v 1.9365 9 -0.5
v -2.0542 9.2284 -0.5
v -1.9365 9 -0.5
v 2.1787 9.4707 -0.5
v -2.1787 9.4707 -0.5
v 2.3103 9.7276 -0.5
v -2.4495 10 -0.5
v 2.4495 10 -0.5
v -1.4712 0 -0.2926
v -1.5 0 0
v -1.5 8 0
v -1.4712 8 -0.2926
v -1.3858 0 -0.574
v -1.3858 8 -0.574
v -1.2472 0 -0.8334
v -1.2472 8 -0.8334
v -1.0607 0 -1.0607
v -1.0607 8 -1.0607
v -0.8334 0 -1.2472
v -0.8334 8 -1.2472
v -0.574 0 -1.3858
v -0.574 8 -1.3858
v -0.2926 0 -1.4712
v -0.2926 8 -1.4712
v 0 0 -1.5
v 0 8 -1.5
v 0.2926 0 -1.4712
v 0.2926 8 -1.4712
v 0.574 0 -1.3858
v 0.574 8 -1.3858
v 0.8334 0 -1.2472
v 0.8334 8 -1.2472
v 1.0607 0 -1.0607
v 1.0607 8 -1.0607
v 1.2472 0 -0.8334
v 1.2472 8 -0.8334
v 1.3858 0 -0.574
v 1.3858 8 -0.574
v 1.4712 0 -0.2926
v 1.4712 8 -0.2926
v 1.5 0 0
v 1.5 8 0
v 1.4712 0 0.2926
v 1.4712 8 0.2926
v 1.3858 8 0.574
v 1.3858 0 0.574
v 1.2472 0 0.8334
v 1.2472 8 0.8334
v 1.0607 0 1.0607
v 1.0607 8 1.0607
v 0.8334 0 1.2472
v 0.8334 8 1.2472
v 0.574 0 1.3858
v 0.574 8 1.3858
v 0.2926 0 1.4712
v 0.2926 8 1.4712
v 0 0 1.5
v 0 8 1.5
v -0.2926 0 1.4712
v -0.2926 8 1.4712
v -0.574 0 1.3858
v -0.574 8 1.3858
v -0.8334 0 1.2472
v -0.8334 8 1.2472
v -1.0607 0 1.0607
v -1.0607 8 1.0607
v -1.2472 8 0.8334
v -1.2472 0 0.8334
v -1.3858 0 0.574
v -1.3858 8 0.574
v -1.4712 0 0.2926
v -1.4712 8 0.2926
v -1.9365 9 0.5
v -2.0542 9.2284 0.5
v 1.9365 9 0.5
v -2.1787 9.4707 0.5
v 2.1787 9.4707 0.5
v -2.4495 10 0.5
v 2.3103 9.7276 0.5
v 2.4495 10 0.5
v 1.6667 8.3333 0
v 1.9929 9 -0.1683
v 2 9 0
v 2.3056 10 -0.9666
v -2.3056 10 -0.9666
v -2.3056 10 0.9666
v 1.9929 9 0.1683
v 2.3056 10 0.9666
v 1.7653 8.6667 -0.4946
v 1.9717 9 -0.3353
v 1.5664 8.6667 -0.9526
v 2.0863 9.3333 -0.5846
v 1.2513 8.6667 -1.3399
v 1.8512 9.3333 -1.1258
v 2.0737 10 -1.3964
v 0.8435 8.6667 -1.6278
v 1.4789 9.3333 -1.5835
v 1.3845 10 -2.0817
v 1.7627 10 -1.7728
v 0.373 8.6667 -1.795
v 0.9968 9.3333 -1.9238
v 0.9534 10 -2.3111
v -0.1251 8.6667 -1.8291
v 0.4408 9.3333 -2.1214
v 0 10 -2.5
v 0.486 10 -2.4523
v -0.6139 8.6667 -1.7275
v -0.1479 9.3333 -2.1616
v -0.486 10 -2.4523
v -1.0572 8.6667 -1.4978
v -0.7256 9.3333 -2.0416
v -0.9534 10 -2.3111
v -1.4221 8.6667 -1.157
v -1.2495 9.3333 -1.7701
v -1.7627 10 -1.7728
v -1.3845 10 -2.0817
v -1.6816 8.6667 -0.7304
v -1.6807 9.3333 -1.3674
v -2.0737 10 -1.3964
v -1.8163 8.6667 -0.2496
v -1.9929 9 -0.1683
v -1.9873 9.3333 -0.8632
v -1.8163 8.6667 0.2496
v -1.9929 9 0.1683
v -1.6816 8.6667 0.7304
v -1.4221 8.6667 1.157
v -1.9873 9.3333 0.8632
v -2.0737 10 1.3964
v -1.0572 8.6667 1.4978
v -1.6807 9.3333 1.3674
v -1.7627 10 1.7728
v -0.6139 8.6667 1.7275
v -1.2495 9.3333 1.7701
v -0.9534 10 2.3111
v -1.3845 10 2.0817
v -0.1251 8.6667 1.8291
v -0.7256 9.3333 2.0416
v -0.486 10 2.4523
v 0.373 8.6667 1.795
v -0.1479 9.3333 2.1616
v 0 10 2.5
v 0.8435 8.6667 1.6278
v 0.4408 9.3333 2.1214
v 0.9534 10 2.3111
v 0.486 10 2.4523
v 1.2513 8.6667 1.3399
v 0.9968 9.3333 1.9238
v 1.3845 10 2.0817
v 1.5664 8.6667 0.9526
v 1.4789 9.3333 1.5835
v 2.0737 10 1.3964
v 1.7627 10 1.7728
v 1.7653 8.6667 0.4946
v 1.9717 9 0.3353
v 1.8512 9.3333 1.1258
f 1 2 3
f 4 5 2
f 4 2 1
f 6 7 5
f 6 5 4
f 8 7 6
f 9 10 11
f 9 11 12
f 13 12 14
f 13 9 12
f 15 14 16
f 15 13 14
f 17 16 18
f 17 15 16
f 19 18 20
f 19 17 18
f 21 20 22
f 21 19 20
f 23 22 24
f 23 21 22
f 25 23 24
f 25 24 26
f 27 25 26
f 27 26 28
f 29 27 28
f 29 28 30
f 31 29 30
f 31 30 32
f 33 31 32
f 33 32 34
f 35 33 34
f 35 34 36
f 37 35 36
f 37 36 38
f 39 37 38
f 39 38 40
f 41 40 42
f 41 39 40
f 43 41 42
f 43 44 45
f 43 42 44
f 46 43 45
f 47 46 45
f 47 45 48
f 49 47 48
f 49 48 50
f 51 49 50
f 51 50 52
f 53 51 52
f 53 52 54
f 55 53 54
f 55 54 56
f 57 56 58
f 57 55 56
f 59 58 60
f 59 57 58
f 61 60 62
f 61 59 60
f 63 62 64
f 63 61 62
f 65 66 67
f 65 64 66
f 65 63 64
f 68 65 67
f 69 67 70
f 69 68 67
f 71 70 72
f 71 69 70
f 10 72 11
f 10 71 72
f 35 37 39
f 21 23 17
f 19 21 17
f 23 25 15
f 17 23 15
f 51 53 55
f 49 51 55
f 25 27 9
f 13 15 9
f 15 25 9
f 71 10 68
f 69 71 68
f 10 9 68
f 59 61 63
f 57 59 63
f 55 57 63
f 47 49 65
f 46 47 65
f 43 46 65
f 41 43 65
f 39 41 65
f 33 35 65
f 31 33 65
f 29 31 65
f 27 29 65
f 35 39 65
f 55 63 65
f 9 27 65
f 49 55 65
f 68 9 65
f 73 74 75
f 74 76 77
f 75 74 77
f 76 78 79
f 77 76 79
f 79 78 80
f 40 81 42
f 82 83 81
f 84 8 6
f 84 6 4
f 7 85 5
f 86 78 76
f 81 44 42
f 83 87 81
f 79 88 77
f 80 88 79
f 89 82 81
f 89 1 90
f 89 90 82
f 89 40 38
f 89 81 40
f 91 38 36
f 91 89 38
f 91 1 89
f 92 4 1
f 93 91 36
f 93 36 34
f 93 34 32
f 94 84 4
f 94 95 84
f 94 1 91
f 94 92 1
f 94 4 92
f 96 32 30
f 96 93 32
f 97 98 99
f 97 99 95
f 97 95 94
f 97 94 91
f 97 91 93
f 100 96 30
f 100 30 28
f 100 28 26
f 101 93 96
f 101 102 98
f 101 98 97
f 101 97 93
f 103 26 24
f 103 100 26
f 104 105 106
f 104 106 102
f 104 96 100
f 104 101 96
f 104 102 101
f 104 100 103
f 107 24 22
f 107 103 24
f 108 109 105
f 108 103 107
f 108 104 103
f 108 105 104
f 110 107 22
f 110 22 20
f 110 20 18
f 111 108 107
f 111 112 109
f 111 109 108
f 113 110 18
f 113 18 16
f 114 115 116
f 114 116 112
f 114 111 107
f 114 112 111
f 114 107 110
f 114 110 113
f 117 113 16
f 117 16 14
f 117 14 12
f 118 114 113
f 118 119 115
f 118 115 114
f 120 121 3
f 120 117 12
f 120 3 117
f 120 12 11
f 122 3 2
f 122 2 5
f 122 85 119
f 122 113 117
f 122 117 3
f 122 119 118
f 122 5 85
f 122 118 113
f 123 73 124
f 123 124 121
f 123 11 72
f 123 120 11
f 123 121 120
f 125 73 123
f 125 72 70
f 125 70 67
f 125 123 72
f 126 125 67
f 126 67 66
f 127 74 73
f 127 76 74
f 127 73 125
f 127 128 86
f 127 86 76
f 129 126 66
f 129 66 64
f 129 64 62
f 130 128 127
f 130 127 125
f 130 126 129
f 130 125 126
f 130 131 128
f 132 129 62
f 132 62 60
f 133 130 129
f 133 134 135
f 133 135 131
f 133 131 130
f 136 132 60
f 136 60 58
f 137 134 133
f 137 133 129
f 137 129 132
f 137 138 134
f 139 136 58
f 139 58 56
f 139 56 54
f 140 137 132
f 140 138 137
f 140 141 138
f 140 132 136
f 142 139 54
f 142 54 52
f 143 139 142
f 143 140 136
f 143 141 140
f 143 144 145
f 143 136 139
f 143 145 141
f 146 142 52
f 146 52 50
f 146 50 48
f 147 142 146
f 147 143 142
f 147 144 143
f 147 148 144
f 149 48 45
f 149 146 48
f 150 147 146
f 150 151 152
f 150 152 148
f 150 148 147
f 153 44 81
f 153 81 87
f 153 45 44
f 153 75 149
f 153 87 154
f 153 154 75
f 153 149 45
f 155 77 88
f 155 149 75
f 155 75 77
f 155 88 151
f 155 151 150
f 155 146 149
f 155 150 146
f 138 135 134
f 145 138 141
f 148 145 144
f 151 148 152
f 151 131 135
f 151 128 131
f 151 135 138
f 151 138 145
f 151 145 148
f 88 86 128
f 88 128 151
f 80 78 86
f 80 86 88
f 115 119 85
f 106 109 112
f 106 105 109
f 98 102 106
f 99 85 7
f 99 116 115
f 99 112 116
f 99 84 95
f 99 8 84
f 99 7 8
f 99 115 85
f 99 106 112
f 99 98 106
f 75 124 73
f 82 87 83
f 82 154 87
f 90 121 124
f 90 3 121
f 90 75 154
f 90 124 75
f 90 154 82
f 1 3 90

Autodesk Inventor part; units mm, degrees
ref_plane "YZ Plane" through (0, 0, 0) normal (1, 0, 0) x (0, 1, 0)
ref_plane "XZ Plane" through (0, 0, 0) normal (0, 1, 0) x (-1, 0, 0)
sketch "Sketch1" plane through (0, 0, 0) normal (0, 1, 0) x (-1, 0, 0)
  circle A0 centre (0, 0) radius 1.5
  dimension "d0" = 3
extrude "Extrusion1" add sketch "Sketch1" along normal blind 8
thread "Thread1" size "M3x0.5" class "6g" standard "ANSI Metric M Profile" full length
ref_plane "Work Plane1" through (0, 10, 0) normal (0, 1, 0) x (1, 0, 0)
sketch "Sketch4" plane through (0, 10, 0) normal (0, 1, 0) x (1, 0, 0)
  circle A0 centre (0, 0) radius 2.5
  dimension "d14" = 5
loft "Loft1" add profiles "Sketch4" section 2 edges at (1.5, 8, 0)
sketch "Sketch5" plane through (0, 10, 0) normal (0, 1, 0) x (1, 0, 0)
  circle A0 centre (0, 0) radius 2.5 projected
  line L0 (-2.4495, 0.5) -> (2.4495, 0.5)
  line L1 (-2.4495, -0.5) -> (2.4495, -0.5)
  line L2 (0, 0) -> (2.0973, 0) construction
  dimension "d19" = 1
extrude "Extrusion4" cut sketch "Sketch5" against normal blind 1 contours A0 L1 L0
properties part number "Screw_CountersunkHead_3x10" material "Steel, Galvanized"
